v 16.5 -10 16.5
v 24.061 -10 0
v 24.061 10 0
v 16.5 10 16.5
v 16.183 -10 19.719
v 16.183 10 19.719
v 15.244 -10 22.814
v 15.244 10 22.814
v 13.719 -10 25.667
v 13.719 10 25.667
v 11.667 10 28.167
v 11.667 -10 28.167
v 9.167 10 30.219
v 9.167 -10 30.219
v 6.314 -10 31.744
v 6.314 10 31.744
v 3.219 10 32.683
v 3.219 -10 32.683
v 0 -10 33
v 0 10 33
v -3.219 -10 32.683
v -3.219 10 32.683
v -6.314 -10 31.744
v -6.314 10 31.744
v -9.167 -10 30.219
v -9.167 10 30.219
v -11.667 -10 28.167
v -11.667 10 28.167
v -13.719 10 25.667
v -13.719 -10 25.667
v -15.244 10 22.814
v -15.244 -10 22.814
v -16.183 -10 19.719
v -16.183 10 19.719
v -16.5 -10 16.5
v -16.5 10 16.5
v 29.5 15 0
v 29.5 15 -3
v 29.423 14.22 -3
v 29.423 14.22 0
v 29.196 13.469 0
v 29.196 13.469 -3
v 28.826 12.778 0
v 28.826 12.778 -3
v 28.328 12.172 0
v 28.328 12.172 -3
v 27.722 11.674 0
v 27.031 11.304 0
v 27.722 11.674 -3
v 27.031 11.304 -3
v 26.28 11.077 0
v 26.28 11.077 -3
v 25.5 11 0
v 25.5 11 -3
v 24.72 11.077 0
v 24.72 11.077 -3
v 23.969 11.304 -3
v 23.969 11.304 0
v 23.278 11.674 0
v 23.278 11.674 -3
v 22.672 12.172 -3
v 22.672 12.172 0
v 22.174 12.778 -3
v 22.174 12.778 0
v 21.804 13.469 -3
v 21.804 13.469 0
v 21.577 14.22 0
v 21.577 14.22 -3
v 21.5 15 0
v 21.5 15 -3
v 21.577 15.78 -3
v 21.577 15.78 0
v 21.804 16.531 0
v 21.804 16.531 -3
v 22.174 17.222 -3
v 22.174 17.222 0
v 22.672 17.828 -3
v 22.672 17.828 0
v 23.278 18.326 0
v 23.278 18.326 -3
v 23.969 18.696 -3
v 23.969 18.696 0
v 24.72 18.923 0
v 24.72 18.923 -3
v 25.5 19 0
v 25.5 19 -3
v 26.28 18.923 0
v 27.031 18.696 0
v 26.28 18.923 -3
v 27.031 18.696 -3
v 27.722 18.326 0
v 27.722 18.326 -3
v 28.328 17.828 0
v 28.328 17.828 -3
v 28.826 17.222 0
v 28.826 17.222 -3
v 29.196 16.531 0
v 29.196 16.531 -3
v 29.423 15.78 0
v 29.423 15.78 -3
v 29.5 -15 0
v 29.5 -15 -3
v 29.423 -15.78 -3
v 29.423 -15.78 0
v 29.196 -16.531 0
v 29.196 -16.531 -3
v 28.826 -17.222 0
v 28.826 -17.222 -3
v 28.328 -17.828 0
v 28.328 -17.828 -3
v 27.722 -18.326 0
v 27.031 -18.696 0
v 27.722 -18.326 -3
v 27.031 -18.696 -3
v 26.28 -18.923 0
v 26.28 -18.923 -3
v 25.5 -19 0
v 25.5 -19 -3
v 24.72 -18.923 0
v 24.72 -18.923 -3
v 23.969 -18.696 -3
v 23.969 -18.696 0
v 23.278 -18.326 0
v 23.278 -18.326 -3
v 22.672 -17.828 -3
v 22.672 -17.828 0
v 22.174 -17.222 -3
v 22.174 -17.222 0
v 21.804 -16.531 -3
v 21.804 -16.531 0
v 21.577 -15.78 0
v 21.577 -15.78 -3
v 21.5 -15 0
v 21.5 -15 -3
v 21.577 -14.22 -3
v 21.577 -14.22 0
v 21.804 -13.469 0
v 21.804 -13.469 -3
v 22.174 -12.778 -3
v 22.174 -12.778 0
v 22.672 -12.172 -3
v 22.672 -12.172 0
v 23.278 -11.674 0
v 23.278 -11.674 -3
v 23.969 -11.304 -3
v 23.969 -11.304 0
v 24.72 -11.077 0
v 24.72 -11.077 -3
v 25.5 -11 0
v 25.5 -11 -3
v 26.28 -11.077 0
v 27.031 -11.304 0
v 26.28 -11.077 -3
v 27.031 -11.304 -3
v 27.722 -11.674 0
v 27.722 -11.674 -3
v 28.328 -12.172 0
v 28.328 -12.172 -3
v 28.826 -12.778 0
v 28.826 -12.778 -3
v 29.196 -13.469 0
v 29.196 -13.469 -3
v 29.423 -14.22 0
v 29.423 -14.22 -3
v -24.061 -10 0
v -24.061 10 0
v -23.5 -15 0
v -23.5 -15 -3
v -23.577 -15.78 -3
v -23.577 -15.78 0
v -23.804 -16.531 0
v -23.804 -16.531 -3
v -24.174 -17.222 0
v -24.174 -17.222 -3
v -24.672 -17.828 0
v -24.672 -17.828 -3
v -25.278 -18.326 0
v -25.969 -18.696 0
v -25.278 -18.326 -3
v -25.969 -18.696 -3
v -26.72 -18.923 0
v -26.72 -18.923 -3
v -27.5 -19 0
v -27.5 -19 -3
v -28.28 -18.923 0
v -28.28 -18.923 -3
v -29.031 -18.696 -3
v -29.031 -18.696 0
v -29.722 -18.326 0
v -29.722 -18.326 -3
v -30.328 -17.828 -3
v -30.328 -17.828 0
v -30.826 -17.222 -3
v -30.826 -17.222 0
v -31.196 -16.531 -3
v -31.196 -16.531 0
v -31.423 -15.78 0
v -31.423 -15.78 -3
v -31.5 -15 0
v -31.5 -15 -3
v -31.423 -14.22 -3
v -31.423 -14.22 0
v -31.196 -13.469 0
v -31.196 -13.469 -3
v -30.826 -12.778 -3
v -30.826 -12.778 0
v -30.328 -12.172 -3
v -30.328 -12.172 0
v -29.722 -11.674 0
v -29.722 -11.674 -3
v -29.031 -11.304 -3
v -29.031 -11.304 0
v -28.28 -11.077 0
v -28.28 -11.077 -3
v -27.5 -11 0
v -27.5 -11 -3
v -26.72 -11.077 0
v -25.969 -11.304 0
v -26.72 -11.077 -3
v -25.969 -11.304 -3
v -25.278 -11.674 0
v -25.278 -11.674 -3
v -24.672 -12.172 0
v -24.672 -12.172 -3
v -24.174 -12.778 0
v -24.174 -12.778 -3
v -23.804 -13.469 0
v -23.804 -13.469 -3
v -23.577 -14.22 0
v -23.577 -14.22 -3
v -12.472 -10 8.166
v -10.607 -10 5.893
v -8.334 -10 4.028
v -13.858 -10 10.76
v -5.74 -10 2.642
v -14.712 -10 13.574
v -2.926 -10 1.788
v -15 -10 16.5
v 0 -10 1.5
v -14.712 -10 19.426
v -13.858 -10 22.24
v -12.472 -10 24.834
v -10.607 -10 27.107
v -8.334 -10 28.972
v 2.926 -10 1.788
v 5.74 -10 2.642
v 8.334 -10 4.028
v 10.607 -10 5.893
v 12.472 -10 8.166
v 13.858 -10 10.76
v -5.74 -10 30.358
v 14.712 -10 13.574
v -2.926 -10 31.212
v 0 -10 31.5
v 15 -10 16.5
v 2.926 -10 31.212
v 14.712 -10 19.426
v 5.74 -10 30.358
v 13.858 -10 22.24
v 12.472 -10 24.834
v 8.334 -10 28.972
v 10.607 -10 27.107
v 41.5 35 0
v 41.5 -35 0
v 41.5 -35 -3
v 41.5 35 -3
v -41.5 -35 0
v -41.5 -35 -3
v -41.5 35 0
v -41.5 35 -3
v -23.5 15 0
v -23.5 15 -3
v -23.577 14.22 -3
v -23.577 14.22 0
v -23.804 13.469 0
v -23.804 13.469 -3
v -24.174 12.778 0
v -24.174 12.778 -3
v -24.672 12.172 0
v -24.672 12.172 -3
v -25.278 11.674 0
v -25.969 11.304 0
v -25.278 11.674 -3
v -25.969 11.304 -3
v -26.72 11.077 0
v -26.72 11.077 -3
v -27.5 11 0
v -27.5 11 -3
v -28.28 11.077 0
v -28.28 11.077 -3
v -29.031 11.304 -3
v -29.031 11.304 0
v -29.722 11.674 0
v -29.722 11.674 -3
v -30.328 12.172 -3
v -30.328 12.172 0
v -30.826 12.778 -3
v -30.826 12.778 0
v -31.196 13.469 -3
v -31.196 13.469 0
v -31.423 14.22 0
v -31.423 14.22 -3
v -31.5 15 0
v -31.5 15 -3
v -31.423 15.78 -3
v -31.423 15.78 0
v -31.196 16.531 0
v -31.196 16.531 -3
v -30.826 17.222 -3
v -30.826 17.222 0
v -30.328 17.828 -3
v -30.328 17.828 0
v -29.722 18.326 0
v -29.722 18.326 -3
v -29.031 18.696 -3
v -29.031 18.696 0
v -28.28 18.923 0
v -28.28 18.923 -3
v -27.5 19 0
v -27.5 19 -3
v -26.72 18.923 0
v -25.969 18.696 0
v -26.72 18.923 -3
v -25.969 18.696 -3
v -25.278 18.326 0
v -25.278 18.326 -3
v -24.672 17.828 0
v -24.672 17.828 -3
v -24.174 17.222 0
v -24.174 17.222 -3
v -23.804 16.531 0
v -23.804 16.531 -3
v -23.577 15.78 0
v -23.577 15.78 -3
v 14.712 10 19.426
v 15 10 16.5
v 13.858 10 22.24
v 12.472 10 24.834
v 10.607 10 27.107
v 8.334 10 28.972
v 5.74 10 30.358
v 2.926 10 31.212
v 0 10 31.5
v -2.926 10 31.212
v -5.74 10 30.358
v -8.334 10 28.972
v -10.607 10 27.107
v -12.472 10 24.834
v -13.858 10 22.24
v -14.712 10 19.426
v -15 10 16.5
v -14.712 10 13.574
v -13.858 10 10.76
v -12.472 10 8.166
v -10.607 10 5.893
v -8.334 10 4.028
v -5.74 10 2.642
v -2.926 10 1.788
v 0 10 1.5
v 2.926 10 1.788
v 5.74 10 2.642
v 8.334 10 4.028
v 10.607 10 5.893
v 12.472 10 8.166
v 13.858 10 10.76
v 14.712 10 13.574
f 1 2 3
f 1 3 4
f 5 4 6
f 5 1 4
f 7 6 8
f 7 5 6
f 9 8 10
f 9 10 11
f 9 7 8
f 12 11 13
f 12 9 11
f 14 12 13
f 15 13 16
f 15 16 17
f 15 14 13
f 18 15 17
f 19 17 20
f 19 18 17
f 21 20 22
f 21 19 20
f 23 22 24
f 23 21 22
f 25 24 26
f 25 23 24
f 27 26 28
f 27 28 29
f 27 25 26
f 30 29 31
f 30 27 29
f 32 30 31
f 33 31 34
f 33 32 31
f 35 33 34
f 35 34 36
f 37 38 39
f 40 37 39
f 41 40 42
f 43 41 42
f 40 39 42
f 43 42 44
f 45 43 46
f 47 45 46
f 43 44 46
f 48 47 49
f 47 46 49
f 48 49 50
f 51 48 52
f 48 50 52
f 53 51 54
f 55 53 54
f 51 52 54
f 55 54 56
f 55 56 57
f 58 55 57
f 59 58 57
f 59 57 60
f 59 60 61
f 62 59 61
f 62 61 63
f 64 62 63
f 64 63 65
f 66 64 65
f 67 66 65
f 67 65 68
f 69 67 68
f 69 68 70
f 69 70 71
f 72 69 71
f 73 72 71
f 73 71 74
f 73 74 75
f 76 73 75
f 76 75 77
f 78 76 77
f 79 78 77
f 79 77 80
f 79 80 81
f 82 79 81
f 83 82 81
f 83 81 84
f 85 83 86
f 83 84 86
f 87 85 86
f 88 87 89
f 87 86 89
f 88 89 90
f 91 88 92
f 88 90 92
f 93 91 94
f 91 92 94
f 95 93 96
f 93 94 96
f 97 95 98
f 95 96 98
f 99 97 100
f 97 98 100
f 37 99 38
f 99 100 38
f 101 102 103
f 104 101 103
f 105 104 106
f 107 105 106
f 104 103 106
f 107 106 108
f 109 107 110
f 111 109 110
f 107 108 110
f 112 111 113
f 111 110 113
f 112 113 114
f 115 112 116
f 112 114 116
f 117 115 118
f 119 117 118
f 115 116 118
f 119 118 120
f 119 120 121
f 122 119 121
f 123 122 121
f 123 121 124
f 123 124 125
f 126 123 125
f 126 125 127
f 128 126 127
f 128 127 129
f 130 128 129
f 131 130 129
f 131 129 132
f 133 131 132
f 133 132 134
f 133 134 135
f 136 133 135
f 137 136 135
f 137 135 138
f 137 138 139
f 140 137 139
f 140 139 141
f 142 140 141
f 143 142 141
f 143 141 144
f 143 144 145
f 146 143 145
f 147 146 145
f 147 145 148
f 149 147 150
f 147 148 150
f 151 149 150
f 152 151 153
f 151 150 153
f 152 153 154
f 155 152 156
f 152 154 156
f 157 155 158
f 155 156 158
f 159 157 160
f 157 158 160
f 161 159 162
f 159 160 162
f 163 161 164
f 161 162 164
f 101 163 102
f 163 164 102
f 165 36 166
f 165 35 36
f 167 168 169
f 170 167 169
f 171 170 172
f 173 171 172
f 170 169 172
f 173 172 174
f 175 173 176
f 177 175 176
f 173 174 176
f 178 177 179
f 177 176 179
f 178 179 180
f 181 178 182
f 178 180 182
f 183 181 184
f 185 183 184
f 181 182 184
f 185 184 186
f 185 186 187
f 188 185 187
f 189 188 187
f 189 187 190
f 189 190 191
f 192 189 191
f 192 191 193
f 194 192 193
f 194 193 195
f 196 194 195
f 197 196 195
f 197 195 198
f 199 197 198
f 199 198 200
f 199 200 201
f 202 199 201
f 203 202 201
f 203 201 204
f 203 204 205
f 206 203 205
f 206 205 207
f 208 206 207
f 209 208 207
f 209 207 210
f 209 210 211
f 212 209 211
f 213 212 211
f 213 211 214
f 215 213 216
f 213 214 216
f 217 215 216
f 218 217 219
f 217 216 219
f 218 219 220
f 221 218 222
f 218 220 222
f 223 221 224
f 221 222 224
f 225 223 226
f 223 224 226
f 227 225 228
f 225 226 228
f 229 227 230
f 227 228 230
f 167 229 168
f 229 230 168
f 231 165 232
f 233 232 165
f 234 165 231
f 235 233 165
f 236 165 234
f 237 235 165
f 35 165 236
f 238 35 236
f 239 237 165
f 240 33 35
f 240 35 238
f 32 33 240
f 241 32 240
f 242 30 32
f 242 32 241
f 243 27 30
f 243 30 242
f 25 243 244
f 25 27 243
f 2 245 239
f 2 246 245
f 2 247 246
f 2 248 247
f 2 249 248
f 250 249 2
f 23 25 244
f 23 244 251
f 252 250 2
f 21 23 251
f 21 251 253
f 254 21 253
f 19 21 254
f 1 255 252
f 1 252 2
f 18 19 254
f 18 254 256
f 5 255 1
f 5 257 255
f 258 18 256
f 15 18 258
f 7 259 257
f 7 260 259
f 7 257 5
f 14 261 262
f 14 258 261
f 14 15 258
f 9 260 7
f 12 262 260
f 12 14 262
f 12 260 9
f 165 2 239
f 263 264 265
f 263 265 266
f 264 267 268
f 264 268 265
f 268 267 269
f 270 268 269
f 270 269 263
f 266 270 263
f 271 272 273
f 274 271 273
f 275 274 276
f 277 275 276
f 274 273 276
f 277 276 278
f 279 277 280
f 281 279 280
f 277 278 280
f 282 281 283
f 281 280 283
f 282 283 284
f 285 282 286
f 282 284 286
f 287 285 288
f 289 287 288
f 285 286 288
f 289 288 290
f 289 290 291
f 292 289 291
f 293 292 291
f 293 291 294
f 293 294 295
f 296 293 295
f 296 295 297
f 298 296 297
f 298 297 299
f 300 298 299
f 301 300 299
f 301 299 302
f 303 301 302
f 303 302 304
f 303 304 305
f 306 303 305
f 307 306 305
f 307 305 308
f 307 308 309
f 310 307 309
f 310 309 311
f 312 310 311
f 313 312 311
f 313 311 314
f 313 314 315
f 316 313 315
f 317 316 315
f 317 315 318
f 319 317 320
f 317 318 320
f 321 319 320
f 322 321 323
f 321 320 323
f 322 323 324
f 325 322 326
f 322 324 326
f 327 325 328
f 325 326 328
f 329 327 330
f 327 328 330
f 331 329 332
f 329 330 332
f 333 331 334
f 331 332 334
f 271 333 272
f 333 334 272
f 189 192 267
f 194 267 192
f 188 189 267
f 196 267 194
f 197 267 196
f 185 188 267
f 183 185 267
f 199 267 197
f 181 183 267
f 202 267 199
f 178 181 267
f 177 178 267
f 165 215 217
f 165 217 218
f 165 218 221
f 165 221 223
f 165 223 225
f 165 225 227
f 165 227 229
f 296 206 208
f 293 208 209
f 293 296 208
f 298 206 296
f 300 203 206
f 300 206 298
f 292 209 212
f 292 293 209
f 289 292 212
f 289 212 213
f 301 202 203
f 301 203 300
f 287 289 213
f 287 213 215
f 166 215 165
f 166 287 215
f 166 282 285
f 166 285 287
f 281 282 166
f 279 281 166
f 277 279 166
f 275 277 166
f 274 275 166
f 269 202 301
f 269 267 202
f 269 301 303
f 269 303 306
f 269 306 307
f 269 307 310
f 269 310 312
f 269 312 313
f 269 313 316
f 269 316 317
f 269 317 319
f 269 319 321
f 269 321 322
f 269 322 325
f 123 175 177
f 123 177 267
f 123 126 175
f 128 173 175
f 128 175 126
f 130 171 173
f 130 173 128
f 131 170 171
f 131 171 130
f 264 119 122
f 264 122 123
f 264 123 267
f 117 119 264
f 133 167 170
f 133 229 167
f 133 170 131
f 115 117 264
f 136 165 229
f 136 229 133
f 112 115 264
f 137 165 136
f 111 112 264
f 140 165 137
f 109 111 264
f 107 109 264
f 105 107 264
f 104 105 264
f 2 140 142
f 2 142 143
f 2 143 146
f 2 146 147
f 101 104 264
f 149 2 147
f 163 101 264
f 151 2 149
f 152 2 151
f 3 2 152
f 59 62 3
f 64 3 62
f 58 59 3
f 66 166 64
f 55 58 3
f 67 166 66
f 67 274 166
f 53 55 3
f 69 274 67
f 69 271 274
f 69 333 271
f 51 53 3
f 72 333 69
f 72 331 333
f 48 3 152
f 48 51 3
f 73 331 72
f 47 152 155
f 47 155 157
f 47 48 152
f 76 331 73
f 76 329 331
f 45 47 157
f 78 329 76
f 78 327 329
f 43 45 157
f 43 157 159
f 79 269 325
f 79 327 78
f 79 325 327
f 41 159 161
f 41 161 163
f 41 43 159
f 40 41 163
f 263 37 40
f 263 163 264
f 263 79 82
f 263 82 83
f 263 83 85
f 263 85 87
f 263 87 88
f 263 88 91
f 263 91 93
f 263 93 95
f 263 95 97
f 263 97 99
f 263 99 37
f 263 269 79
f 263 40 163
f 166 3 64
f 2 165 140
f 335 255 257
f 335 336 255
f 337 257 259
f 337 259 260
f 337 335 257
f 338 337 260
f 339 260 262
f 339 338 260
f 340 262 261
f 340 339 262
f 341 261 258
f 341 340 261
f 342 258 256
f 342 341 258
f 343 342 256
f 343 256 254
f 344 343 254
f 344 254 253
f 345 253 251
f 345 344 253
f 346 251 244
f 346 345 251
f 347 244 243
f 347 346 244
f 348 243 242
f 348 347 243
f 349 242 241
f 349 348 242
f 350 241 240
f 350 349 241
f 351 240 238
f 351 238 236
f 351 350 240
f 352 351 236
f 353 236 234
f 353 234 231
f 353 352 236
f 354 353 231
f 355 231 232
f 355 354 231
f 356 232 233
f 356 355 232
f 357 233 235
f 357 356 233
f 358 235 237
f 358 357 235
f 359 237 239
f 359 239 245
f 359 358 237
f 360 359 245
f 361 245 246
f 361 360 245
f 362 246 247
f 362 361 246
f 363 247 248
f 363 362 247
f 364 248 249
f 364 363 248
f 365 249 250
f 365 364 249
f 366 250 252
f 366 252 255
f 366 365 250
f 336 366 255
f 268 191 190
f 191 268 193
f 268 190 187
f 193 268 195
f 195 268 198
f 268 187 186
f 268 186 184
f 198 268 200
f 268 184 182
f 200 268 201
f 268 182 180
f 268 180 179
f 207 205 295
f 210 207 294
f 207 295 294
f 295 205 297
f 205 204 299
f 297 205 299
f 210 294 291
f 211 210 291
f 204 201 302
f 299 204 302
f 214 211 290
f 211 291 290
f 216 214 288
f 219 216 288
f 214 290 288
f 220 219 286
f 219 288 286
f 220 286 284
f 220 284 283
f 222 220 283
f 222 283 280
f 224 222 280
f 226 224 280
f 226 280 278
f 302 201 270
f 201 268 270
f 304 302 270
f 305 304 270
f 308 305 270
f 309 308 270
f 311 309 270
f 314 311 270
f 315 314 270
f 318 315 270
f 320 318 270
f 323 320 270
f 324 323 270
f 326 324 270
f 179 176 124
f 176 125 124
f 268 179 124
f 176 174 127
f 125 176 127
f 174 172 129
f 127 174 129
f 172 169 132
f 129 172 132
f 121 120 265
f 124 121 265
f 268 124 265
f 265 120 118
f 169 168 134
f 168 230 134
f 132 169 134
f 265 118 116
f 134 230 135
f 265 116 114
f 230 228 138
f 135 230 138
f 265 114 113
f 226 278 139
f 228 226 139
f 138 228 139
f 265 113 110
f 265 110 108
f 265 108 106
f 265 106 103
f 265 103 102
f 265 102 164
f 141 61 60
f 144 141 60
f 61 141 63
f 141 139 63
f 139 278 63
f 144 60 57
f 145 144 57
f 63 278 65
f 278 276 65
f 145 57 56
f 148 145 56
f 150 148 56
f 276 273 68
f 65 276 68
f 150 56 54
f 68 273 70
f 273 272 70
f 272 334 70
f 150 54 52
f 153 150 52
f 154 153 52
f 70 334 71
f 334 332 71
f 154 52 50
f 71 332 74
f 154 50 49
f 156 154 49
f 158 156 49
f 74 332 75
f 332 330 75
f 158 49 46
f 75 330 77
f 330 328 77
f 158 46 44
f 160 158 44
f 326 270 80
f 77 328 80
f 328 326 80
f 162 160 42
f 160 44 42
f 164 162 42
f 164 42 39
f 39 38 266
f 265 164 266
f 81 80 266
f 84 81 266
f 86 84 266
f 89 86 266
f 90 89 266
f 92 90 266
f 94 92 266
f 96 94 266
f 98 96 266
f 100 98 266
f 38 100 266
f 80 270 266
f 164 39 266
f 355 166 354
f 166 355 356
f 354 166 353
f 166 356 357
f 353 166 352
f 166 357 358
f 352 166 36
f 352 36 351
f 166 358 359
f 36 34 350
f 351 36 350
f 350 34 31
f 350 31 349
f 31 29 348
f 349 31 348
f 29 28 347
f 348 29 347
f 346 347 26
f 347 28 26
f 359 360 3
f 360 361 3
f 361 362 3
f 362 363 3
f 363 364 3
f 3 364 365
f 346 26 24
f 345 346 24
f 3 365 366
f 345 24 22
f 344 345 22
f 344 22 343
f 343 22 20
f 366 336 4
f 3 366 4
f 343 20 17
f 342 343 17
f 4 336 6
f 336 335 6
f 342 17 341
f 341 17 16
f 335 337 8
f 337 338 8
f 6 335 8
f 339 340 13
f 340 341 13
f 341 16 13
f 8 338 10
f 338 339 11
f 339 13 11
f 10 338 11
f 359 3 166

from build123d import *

# Parameters (mm, degrees)
F0_W     = 83
F0_H     = 70
F1_DEPTH = 3
F2_R     = 15
F3_DEPTH = 10
F4_R     = 4
F5_DEPTH = 25


with BuildPart() as f1:
    # F0 (on Top) → F1 (new body)
    with BuildSketch(Plane.XY):
        Rectangle(F0_W, F0_H)
    extrude(amount=-F1_DEPTH)

    # F2 (on Front) → F3 (join, symmetric)
    with BuildSketch(Plane.XZ):
        with BuildLine():
            ThreePointArc((0, 0), (-11.667262, 4.832738), (-16.5, 16.5))
            Line((-16.5, 16.5), (-24.06125, 0))
            Line((-24.06125, 0), (0, 0))
        make_face()
        with BuildLine():
            Line((24.06125, 0), (16.5, 16.5))
            ThreePointArc((16.5, 16.5), (11.667262, 4.832738), (0, 0))
            Line((0, 0), (24.06125, 0))
        make_face()
        with BuildLine():
            ThreePointArc((0, 0), (11.667262, 4.832738), (16.5, 16.5))
            ThreePointArc((16.5, 16.5), (0, 33), (-16.5, 16.5))
            ThreePointArc((-16.5, 16.5), (-11.667262, 4.832738), (0, 0))
        make_face()
        with Locations((0, 16.5)):
            Circle(F2_R, mode=Mode.SUBTRACT)
    extrude(amount=F3_DEPTH, both=True)

    # F4 (on face) → F5 (cut)
    with BuildSketch(Plane(origin=(0, 0, -3), x_dir=(1, 0, 0), z_dir=(0, 0, -1))):
        with Locations((-27.5, -15)):
            Circle(F4_R)
        with Locations((-27.5, 15)):
            Circle(F4_R)
        with Locations((25.5, 15)):
            Circle(F4_R)
        with Locations((25.5, -15)):
            Circle(F4_R)
    extrude(amount=-F5_DEPTH, mode=Mode.SUBTRACT)


solid = f1.part
